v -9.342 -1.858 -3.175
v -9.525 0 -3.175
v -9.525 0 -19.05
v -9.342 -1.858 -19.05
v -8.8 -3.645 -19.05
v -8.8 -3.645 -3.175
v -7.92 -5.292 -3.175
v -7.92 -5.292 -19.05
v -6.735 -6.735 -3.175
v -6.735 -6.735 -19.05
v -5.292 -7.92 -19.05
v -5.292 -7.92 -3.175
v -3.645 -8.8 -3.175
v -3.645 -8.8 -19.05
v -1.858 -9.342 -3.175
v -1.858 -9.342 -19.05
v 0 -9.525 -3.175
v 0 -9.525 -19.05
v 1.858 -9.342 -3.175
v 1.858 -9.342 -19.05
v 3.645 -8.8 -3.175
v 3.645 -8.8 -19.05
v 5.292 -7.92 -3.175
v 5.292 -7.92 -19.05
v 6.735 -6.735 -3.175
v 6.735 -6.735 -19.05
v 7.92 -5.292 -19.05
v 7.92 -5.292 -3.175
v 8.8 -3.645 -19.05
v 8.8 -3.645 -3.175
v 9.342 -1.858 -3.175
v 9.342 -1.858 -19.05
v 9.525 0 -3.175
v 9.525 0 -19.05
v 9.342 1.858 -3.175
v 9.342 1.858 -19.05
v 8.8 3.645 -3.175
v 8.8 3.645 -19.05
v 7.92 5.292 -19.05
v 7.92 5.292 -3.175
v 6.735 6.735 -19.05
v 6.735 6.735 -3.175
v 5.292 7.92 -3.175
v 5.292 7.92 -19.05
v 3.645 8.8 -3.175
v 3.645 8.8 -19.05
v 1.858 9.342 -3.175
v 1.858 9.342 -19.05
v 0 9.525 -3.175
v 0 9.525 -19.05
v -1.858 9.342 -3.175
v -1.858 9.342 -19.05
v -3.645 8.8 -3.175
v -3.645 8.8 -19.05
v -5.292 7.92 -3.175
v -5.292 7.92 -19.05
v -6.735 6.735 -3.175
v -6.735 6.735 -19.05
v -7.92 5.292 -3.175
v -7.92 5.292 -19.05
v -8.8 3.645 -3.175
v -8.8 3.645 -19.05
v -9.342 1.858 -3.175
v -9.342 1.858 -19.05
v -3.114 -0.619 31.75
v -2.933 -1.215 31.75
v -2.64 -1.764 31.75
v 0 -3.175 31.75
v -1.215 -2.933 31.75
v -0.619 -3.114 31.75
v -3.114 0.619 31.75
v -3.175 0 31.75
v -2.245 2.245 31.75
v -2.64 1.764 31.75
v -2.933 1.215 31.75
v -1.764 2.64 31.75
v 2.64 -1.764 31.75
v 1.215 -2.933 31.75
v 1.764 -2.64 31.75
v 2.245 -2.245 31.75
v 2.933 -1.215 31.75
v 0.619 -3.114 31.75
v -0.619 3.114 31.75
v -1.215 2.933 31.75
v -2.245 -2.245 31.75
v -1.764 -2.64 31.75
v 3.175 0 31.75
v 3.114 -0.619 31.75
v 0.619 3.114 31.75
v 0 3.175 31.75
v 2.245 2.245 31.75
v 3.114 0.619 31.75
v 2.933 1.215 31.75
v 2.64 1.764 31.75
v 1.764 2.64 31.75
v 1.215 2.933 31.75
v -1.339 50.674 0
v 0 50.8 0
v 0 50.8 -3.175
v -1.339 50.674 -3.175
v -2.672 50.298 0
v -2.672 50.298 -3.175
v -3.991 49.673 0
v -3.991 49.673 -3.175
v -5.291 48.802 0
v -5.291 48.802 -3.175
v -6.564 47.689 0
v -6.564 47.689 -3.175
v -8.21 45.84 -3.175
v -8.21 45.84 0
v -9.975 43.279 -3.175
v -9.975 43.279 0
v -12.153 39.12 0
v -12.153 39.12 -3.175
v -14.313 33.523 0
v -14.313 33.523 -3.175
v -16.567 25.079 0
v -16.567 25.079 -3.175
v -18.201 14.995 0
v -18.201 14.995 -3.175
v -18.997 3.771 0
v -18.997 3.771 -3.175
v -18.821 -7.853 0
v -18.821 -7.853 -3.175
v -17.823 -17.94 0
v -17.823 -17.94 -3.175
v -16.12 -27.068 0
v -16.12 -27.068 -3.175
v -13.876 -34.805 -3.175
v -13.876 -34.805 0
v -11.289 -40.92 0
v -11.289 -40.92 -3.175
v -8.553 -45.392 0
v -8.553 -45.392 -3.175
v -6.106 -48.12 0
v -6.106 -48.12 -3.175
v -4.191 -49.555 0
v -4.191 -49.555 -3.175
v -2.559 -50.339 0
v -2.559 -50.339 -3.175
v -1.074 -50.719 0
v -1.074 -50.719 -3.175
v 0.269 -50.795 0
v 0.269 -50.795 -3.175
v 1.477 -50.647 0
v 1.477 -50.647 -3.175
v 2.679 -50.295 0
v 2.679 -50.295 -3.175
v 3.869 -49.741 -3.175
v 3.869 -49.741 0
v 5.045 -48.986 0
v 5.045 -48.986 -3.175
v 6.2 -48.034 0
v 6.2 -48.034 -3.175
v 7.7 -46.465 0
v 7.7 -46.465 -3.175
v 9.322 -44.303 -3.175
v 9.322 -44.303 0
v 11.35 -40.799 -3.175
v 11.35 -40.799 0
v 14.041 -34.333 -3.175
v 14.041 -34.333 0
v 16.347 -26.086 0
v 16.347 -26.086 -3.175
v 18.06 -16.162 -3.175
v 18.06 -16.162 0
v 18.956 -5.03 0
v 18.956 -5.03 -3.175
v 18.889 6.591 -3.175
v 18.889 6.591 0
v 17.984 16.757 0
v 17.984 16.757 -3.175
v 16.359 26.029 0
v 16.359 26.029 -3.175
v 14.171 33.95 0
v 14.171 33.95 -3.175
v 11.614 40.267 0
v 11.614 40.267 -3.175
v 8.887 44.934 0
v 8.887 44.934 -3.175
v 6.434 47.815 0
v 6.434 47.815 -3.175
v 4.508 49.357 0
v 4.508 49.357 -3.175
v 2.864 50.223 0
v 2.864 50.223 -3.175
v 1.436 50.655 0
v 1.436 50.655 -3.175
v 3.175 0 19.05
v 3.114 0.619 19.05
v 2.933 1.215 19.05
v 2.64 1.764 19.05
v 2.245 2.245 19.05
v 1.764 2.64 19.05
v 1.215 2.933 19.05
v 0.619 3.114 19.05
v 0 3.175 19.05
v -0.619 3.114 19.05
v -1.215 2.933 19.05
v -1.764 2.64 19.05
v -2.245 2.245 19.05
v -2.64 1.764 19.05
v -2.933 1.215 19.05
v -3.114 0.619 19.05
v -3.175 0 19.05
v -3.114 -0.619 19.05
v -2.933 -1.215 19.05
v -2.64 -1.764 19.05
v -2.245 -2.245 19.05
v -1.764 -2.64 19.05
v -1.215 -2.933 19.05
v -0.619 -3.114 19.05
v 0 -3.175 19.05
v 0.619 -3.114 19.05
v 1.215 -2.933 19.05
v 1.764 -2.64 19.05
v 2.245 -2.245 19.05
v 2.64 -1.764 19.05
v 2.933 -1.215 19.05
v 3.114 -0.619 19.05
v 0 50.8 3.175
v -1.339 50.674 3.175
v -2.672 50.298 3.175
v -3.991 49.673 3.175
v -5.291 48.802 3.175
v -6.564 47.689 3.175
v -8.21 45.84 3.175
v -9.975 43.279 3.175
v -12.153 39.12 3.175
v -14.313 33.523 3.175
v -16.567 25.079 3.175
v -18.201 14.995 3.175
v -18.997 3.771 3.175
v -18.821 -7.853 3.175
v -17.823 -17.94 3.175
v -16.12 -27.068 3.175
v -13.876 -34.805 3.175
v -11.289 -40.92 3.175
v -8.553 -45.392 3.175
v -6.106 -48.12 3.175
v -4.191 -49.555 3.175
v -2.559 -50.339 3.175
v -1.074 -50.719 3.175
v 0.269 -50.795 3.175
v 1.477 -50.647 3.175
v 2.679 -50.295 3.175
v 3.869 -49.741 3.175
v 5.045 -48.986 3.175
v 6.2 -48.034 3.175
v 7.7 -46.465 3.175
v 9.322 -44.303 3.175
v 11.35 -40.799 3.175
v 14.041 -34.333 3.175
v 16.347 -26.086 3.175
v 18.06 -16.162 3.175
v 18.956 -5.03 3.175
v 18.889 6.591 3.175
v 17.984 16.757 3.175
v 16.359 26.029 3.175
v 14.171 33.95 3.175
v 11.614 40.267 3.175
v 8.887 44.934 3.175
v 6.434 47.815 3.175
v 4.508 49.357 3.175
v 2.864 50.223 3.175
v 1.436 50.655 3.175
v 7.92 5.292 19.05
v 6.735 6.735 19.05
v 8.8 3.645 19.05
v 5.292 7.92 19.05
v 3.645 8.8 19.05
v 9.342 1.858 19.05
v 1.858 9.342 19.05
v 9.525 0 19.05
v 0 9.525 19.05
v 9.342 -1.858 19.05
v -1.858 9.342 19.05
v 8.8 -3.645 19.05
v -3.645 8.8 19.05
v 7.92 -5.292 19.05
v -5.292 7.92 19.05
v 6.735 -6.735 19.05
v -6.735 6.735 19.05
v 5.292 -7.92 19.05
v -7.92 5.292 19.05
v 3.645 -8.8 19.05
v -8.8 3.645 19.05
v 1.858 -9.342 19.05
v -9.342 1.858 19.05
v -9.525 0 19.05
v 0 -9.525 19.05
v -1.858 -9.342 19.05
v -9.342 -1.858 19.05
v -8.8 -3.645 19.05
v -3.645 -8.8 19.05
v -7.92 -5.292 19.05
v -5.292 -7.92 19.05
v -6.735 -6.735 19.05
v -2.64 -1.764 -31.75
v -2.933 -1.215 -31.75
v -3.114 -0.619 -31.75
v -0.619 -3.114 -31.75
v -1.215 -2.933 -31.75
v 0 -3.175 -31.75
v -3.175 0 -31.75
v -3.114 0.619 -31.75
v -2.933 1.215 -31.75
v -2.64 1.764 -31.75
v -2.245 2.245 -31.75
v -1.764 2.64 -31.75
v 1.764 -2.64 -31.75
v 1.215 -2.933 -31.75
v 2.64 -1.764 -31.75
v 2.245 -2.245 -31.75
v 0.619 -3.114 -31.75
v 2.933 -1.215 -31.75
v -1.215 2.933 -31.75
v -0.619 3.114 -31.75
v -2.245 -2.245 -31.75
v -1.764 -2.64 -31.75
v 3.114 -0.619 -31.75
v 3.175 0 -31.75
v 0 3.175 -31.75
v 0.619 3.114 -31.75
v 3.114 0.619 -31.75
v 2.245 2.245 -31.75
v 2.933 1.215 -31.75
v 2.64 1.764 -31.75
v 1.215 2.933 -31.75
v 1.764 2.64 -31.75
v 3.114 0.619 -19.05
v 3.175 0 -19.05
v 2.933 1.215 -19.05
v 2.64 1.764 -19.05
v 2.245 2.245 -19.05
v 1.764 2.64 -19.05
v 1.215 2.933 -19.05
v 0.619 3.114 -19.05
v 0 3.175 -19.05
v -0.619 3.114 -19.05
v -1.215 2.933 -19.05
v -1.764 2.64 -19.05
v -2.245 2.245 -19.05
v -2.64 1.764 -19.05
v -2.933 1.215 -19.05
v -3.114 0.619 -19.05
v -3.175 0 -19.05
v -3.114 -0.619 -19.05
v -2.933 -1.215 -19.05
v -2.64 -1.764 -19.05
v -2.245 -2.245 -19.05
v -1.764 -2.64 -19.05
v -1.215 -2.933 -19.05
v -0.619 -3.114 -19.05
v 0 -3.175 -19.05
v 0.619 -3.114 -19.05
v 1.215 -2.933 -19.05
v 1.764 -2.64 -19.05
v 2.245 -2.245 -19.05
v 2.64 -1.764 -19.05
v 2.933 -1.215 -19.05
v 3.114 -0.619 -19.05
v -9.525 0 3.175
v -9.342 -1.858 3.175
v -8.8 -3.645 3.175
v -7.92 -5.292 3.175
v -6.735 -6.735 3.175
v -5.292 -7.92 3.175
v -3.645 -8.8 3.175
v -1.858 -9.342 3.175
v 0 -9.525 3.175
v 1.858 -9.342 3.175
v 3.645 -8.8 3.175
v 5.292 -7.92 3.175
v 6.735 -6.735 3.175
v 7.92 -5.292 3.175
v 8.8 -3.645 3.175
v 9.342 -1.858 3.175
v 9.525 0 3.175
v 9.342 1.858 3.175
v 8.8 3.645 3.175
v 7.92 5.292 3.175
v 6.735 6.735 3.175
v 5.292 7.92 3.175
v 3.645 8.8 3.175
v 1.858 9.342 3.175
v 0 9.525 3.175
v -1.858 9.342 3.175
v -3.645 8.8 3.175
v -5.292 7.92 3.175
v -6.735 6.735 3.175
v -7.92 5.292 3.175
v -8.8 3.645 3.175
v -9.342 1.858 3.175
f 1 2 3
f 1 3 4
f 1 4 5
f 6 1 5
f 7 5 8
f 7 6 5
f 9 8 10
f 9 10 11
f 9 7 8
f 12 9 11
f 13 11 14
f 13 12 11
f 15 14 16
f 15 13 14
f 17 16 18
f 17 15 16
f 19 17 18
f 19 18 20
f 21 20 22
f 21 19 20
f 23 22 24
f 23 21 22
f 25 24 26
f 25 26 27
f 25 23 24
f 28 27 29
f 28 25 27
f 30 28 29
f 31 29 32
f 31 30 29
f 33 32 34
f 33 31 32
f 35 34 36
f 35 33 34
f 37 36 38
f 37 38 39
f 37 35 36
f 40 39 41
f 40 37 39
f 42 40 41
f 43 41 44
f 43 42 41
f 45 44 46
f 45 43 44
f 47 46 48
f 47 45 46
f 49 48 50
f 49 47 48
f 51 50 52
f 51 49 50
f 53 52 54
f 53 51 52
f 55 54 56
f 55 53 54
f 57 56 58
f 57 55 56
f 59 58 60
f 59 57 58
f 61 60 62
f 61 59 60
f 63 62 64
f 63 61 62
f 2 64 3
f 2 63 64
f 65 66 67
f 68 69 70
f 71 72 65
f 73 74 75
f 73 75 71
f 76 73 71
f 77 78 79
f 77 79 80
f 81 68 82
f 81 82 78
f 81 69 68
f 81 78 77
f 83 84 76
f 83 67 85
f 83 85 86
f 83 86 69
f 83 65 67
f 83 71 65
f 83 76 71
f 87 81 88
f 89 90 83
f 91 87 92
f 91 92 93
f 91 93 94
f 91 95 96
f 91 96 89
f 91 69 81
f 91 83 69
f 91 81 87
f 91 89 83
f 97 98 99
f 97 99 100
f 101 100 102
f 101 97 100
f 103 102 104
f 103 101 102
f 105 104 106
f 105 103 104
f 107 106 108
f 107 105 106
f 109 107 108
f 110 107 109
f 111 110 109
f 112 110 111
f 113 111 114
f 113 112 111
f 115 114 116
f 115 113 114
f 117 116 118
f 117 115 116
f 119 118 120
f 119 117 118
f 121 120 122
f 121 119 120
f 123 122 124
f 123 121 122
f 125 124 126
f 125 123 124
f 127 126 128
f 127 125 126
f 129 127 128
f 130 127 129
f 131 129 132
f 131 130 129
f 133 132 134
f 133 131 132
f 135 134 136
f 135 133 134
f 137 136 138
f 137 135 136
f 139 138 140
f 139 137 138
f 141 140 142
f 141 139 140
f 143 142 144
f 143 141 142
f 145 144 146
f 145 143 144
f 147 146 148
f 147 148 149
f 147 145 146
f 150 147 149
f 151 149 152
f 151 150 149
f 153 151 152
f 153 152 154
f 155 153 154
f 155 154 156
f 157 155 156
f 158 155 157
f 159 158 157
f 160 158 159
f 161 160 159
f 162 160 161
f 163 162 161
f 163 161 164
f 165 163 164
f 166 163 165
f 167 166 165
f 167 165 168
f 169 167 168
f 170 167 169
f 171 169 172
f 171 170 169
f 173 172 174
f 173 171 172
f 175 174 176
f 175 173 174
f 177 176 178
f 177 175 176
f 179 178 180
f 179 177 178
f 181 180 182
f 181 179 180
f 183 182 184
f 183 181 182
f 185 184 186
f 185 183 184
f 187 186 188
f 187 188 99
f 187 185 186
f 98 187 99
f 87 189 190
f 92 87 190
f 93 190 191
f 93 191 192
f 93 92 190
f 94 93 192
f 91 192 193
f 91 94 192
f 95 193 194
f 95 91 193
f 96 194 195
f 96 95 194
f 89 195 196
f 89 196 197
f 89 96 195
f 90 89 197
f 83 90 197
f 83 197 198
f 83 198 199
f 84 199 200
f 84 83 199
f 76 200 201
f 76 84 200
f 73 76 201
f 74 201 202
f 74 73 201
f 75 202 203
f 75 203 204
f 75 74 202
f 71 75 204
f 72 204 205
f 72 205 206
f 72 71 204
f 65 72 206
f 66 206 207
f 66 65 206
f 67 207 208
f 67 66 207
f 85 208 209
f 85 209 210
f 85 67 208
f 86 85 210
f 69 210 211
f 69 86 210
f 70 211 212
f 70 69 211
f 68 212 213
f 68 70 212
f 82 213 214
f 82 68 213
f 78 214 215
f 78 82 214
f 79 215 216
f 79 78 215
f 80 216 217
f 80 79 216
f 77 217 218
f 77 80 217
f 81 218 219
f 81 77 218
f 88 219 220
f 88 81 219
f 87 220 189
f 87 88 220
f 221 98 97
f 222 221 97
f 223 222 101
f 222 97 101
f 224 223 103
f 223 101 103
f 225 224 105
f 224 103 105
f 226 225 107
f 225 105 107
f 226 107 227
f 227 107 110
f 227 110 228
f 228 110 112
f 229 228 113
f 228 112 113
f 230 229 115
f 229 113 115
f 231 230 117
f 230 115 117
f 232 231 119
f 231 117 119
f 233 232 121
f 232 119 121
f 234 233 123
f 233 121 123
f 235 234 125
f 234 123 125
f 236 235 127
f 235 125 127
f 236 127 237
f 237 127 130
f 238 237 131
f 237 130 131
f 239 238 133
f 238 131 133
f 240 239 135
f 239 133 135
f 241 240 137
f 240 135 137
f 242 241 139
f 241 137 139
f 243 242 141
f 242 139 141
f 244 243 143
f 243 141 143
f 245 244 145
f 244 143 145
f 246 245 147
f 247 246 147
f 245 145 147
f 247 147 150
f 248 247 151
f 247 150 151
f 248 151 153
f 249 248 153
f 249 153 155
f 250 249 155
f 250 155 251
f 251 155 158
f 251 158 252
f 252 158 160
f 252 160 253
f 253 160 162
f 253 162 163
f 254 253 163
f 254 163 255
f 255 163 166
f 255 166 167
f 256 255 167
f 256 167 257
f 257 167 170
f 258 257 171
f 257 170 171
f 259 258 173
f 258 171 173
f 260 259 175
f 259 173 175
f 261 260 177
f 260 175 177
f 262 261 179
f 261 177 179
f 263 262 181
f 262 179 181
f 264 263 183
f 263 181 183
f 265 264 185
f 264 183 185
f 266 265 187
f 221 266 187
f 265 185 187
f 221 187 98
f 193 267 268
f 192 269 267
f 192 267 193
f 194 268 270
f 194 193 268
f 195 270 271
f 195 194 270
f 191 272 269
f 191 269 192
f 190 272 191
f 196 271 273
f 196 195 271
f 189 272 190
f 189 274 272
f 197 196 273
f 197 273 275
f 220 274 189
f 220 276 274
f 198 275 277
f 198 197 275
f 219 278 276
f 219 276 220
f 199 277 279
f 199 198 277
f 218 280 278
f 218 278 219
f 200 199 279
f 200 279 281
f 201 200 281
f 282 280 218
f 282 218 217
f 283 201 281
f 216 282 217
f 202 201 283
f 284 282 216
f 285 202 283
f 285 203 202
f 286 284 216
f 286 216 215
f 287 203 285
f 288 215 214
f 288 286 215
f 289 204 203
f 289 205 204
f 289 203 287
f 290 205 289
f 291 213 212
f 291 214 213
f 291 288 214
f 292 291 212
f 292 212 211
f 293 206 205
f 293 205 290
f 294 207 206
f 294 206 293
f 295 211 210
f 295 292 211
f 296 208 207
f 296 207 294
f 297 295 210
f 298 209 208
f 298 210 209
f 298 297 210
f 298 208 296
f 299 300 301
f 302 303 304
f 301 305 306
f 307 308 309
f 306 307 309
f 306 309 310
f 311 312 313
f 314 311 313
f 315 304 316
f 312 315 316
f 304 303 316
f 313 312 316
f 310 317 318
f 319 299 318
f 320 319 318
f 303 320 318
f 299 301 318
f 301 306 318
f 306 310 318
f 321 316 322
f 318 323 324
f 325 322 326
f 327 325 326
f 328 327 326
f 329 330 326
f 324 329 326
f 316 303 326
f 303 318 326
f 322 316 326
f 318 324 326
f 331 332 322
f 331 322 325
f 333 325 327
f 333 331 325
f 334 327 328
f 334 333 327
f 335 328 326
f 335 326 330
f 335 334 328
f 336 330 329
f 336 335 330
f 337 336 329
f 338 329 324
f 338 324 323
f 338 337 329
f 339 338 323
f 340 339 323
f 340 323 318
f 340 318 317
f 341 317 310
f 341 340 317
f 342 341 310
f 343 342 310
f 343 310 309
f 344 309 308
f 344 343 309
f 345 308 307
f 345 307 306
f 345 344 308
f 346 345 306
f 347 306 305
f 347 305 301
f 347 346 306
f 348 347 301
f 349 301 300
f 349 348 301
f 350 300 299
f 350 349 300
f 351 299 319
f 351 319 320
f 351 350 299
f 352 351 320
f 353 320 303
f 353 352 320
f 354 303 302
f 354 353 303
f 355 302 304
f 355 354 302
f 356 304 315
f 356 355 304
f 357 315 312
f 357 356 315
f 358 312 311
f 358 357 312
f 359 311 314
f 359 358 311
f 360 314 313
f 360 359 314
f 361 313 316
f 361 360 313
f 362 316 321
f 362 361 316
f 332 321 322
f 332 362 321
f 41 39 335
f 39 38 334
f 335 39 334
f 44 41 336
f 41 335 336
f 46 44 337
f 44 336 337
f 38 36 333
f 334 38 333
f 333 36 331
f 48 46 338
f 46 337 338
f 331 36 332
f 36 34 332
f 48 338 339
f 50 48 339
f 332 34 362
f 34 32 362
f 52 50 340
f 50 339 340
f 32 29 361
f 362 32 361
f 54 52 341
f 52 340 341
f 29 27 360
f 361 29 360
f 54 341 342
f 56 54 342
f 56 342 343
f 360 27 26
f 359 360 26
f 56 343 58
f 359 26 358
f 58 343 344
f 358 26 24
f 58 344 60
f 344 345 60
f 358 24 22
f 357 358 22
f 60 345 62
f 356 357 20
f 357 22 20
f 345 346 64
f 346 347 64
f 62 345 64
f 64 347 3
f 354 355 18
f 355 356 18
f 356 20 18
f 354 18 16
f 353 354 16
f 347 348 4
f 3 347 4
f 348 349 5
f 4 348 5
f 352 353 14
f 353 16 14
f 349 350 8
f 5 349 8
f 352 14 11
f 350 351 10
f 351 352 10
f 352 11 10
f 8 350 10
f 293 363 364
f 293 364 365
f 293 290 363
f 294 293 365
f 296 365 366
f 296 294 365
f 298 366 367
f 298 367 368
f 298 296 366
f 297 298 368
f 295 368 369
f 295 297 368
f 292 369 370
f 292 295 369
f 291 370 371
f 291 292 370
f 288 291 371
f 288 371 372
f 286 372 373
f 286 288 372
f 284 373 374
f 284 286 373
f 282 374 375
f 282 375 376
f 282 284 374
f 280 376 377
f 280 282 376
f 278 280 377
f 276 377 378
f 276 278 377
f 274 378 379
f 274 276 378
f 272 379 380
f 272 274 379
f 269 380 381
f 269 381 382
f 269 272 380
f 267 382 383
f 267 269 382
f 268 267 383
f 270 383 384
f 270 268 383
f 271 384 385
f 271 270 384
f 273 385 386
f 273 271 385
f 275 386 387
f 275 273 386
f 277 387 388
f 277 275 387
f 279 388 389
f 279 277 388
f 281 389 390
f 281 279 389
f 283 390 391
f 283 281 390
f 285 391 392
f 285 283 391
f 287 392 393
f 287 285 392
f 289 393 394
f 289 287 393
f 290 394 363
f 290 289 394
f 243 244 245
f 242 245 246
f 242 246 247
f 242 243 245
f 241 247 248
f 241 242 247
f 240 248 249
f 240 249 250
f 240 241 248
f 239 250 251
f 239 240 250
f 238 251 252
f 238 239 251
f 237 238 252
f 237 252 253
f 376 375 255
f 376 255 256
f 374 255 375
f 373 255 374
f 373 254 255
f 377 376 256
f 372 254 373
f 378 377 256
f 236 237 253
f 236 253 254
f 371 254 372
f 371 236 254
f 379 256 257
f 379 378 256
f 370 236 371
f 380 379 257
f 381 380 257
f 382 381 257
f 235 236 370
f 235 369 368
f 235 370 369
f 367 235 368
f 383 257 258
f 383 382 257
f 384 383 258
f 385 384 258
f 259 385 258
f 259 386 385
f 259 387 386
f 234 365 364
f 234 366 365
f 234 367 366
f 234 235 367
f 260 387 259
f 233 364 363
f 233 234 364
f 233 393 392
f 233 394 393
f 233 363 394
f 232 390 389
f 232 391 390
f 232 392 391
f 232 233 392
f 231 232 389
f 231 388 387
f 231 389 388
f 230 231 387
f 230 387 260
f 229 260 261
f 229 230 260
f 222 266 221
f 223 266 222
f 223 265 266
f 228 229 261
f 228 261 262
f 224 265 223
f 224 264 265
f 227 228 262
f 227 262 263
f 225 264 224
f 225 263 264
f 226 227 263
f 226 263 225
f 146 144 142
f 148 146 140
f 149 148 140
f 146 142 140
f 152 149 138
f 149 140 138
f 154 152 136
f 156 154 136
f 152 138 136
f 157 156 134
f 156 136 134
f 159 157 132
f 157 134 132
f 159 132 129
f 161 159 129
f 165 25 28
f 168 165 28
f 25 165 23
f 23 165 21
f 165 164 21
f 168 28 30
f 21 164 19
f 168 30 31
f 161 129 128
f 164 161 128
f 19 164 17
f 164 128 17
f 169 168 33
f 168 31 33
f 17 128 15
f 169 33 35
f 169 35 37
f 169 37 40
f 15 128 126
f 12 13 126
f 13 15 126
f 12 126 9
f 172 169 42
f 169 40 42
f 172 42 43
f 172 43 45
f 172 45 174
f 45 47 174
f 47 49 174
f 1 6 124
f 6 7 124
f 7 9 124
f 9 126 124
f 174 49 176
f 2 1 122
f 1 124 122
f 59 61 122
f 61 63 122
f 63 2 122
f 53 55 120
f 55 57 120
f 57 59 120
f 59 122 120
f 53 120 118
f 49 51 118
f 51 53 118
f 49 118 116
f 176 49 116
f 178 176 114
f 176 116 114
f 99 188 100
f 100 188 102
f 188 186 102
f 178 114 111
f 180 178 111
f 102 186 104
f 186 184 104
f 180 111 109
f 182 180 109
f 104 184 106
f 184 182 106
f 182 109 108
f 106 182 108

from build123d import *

# Parameters (mm, degrees)
SKETCH1_RX          = 50.8
SKETCH1_RY          = 19.05
BOSS_EXTRUDE1_DEPTH = 3.175
SKETCH3_R           = 9.525
BOSS_EXTRUDE3_DEPTH = 19.05
SKETCH4_R           = 3.175
BOSS_EXTRUDE4_DEPTH = 31.75


with BuildPart() as part:
    # Sketch1 → Boss-Extrude1 (new, symmetric)
    with BuildSketch(Plane.XY):
        with Locations(Location((0, 0), (0, 0, 90))):
            Ellipse(SKETCH1_RX, SKETCH1_RY)
    extrude(amount=BOSS_EXTRUDE1_DEPTH, both=True)

    # Sketch3 → Boss-Extrude3 (add, symmetric)
    with BuildSketch(Plane.XY):
        with Locations(Location((0, 0, 0), (0, 0, 180))):
            Circle(SKETCH3_R)
    extrude(amount=BOSS_EXTRUDE3_DEPTH, both=True)

    # Sketch4 → Boss-Extrude4 (add, symmetric)
    with BuildSketch(Plane.XY):
        Circle(SKETCH4_R)
    extrude(amount=BOSS_EXTRUDE4_DEPTH, both=True)


solid = part.part
